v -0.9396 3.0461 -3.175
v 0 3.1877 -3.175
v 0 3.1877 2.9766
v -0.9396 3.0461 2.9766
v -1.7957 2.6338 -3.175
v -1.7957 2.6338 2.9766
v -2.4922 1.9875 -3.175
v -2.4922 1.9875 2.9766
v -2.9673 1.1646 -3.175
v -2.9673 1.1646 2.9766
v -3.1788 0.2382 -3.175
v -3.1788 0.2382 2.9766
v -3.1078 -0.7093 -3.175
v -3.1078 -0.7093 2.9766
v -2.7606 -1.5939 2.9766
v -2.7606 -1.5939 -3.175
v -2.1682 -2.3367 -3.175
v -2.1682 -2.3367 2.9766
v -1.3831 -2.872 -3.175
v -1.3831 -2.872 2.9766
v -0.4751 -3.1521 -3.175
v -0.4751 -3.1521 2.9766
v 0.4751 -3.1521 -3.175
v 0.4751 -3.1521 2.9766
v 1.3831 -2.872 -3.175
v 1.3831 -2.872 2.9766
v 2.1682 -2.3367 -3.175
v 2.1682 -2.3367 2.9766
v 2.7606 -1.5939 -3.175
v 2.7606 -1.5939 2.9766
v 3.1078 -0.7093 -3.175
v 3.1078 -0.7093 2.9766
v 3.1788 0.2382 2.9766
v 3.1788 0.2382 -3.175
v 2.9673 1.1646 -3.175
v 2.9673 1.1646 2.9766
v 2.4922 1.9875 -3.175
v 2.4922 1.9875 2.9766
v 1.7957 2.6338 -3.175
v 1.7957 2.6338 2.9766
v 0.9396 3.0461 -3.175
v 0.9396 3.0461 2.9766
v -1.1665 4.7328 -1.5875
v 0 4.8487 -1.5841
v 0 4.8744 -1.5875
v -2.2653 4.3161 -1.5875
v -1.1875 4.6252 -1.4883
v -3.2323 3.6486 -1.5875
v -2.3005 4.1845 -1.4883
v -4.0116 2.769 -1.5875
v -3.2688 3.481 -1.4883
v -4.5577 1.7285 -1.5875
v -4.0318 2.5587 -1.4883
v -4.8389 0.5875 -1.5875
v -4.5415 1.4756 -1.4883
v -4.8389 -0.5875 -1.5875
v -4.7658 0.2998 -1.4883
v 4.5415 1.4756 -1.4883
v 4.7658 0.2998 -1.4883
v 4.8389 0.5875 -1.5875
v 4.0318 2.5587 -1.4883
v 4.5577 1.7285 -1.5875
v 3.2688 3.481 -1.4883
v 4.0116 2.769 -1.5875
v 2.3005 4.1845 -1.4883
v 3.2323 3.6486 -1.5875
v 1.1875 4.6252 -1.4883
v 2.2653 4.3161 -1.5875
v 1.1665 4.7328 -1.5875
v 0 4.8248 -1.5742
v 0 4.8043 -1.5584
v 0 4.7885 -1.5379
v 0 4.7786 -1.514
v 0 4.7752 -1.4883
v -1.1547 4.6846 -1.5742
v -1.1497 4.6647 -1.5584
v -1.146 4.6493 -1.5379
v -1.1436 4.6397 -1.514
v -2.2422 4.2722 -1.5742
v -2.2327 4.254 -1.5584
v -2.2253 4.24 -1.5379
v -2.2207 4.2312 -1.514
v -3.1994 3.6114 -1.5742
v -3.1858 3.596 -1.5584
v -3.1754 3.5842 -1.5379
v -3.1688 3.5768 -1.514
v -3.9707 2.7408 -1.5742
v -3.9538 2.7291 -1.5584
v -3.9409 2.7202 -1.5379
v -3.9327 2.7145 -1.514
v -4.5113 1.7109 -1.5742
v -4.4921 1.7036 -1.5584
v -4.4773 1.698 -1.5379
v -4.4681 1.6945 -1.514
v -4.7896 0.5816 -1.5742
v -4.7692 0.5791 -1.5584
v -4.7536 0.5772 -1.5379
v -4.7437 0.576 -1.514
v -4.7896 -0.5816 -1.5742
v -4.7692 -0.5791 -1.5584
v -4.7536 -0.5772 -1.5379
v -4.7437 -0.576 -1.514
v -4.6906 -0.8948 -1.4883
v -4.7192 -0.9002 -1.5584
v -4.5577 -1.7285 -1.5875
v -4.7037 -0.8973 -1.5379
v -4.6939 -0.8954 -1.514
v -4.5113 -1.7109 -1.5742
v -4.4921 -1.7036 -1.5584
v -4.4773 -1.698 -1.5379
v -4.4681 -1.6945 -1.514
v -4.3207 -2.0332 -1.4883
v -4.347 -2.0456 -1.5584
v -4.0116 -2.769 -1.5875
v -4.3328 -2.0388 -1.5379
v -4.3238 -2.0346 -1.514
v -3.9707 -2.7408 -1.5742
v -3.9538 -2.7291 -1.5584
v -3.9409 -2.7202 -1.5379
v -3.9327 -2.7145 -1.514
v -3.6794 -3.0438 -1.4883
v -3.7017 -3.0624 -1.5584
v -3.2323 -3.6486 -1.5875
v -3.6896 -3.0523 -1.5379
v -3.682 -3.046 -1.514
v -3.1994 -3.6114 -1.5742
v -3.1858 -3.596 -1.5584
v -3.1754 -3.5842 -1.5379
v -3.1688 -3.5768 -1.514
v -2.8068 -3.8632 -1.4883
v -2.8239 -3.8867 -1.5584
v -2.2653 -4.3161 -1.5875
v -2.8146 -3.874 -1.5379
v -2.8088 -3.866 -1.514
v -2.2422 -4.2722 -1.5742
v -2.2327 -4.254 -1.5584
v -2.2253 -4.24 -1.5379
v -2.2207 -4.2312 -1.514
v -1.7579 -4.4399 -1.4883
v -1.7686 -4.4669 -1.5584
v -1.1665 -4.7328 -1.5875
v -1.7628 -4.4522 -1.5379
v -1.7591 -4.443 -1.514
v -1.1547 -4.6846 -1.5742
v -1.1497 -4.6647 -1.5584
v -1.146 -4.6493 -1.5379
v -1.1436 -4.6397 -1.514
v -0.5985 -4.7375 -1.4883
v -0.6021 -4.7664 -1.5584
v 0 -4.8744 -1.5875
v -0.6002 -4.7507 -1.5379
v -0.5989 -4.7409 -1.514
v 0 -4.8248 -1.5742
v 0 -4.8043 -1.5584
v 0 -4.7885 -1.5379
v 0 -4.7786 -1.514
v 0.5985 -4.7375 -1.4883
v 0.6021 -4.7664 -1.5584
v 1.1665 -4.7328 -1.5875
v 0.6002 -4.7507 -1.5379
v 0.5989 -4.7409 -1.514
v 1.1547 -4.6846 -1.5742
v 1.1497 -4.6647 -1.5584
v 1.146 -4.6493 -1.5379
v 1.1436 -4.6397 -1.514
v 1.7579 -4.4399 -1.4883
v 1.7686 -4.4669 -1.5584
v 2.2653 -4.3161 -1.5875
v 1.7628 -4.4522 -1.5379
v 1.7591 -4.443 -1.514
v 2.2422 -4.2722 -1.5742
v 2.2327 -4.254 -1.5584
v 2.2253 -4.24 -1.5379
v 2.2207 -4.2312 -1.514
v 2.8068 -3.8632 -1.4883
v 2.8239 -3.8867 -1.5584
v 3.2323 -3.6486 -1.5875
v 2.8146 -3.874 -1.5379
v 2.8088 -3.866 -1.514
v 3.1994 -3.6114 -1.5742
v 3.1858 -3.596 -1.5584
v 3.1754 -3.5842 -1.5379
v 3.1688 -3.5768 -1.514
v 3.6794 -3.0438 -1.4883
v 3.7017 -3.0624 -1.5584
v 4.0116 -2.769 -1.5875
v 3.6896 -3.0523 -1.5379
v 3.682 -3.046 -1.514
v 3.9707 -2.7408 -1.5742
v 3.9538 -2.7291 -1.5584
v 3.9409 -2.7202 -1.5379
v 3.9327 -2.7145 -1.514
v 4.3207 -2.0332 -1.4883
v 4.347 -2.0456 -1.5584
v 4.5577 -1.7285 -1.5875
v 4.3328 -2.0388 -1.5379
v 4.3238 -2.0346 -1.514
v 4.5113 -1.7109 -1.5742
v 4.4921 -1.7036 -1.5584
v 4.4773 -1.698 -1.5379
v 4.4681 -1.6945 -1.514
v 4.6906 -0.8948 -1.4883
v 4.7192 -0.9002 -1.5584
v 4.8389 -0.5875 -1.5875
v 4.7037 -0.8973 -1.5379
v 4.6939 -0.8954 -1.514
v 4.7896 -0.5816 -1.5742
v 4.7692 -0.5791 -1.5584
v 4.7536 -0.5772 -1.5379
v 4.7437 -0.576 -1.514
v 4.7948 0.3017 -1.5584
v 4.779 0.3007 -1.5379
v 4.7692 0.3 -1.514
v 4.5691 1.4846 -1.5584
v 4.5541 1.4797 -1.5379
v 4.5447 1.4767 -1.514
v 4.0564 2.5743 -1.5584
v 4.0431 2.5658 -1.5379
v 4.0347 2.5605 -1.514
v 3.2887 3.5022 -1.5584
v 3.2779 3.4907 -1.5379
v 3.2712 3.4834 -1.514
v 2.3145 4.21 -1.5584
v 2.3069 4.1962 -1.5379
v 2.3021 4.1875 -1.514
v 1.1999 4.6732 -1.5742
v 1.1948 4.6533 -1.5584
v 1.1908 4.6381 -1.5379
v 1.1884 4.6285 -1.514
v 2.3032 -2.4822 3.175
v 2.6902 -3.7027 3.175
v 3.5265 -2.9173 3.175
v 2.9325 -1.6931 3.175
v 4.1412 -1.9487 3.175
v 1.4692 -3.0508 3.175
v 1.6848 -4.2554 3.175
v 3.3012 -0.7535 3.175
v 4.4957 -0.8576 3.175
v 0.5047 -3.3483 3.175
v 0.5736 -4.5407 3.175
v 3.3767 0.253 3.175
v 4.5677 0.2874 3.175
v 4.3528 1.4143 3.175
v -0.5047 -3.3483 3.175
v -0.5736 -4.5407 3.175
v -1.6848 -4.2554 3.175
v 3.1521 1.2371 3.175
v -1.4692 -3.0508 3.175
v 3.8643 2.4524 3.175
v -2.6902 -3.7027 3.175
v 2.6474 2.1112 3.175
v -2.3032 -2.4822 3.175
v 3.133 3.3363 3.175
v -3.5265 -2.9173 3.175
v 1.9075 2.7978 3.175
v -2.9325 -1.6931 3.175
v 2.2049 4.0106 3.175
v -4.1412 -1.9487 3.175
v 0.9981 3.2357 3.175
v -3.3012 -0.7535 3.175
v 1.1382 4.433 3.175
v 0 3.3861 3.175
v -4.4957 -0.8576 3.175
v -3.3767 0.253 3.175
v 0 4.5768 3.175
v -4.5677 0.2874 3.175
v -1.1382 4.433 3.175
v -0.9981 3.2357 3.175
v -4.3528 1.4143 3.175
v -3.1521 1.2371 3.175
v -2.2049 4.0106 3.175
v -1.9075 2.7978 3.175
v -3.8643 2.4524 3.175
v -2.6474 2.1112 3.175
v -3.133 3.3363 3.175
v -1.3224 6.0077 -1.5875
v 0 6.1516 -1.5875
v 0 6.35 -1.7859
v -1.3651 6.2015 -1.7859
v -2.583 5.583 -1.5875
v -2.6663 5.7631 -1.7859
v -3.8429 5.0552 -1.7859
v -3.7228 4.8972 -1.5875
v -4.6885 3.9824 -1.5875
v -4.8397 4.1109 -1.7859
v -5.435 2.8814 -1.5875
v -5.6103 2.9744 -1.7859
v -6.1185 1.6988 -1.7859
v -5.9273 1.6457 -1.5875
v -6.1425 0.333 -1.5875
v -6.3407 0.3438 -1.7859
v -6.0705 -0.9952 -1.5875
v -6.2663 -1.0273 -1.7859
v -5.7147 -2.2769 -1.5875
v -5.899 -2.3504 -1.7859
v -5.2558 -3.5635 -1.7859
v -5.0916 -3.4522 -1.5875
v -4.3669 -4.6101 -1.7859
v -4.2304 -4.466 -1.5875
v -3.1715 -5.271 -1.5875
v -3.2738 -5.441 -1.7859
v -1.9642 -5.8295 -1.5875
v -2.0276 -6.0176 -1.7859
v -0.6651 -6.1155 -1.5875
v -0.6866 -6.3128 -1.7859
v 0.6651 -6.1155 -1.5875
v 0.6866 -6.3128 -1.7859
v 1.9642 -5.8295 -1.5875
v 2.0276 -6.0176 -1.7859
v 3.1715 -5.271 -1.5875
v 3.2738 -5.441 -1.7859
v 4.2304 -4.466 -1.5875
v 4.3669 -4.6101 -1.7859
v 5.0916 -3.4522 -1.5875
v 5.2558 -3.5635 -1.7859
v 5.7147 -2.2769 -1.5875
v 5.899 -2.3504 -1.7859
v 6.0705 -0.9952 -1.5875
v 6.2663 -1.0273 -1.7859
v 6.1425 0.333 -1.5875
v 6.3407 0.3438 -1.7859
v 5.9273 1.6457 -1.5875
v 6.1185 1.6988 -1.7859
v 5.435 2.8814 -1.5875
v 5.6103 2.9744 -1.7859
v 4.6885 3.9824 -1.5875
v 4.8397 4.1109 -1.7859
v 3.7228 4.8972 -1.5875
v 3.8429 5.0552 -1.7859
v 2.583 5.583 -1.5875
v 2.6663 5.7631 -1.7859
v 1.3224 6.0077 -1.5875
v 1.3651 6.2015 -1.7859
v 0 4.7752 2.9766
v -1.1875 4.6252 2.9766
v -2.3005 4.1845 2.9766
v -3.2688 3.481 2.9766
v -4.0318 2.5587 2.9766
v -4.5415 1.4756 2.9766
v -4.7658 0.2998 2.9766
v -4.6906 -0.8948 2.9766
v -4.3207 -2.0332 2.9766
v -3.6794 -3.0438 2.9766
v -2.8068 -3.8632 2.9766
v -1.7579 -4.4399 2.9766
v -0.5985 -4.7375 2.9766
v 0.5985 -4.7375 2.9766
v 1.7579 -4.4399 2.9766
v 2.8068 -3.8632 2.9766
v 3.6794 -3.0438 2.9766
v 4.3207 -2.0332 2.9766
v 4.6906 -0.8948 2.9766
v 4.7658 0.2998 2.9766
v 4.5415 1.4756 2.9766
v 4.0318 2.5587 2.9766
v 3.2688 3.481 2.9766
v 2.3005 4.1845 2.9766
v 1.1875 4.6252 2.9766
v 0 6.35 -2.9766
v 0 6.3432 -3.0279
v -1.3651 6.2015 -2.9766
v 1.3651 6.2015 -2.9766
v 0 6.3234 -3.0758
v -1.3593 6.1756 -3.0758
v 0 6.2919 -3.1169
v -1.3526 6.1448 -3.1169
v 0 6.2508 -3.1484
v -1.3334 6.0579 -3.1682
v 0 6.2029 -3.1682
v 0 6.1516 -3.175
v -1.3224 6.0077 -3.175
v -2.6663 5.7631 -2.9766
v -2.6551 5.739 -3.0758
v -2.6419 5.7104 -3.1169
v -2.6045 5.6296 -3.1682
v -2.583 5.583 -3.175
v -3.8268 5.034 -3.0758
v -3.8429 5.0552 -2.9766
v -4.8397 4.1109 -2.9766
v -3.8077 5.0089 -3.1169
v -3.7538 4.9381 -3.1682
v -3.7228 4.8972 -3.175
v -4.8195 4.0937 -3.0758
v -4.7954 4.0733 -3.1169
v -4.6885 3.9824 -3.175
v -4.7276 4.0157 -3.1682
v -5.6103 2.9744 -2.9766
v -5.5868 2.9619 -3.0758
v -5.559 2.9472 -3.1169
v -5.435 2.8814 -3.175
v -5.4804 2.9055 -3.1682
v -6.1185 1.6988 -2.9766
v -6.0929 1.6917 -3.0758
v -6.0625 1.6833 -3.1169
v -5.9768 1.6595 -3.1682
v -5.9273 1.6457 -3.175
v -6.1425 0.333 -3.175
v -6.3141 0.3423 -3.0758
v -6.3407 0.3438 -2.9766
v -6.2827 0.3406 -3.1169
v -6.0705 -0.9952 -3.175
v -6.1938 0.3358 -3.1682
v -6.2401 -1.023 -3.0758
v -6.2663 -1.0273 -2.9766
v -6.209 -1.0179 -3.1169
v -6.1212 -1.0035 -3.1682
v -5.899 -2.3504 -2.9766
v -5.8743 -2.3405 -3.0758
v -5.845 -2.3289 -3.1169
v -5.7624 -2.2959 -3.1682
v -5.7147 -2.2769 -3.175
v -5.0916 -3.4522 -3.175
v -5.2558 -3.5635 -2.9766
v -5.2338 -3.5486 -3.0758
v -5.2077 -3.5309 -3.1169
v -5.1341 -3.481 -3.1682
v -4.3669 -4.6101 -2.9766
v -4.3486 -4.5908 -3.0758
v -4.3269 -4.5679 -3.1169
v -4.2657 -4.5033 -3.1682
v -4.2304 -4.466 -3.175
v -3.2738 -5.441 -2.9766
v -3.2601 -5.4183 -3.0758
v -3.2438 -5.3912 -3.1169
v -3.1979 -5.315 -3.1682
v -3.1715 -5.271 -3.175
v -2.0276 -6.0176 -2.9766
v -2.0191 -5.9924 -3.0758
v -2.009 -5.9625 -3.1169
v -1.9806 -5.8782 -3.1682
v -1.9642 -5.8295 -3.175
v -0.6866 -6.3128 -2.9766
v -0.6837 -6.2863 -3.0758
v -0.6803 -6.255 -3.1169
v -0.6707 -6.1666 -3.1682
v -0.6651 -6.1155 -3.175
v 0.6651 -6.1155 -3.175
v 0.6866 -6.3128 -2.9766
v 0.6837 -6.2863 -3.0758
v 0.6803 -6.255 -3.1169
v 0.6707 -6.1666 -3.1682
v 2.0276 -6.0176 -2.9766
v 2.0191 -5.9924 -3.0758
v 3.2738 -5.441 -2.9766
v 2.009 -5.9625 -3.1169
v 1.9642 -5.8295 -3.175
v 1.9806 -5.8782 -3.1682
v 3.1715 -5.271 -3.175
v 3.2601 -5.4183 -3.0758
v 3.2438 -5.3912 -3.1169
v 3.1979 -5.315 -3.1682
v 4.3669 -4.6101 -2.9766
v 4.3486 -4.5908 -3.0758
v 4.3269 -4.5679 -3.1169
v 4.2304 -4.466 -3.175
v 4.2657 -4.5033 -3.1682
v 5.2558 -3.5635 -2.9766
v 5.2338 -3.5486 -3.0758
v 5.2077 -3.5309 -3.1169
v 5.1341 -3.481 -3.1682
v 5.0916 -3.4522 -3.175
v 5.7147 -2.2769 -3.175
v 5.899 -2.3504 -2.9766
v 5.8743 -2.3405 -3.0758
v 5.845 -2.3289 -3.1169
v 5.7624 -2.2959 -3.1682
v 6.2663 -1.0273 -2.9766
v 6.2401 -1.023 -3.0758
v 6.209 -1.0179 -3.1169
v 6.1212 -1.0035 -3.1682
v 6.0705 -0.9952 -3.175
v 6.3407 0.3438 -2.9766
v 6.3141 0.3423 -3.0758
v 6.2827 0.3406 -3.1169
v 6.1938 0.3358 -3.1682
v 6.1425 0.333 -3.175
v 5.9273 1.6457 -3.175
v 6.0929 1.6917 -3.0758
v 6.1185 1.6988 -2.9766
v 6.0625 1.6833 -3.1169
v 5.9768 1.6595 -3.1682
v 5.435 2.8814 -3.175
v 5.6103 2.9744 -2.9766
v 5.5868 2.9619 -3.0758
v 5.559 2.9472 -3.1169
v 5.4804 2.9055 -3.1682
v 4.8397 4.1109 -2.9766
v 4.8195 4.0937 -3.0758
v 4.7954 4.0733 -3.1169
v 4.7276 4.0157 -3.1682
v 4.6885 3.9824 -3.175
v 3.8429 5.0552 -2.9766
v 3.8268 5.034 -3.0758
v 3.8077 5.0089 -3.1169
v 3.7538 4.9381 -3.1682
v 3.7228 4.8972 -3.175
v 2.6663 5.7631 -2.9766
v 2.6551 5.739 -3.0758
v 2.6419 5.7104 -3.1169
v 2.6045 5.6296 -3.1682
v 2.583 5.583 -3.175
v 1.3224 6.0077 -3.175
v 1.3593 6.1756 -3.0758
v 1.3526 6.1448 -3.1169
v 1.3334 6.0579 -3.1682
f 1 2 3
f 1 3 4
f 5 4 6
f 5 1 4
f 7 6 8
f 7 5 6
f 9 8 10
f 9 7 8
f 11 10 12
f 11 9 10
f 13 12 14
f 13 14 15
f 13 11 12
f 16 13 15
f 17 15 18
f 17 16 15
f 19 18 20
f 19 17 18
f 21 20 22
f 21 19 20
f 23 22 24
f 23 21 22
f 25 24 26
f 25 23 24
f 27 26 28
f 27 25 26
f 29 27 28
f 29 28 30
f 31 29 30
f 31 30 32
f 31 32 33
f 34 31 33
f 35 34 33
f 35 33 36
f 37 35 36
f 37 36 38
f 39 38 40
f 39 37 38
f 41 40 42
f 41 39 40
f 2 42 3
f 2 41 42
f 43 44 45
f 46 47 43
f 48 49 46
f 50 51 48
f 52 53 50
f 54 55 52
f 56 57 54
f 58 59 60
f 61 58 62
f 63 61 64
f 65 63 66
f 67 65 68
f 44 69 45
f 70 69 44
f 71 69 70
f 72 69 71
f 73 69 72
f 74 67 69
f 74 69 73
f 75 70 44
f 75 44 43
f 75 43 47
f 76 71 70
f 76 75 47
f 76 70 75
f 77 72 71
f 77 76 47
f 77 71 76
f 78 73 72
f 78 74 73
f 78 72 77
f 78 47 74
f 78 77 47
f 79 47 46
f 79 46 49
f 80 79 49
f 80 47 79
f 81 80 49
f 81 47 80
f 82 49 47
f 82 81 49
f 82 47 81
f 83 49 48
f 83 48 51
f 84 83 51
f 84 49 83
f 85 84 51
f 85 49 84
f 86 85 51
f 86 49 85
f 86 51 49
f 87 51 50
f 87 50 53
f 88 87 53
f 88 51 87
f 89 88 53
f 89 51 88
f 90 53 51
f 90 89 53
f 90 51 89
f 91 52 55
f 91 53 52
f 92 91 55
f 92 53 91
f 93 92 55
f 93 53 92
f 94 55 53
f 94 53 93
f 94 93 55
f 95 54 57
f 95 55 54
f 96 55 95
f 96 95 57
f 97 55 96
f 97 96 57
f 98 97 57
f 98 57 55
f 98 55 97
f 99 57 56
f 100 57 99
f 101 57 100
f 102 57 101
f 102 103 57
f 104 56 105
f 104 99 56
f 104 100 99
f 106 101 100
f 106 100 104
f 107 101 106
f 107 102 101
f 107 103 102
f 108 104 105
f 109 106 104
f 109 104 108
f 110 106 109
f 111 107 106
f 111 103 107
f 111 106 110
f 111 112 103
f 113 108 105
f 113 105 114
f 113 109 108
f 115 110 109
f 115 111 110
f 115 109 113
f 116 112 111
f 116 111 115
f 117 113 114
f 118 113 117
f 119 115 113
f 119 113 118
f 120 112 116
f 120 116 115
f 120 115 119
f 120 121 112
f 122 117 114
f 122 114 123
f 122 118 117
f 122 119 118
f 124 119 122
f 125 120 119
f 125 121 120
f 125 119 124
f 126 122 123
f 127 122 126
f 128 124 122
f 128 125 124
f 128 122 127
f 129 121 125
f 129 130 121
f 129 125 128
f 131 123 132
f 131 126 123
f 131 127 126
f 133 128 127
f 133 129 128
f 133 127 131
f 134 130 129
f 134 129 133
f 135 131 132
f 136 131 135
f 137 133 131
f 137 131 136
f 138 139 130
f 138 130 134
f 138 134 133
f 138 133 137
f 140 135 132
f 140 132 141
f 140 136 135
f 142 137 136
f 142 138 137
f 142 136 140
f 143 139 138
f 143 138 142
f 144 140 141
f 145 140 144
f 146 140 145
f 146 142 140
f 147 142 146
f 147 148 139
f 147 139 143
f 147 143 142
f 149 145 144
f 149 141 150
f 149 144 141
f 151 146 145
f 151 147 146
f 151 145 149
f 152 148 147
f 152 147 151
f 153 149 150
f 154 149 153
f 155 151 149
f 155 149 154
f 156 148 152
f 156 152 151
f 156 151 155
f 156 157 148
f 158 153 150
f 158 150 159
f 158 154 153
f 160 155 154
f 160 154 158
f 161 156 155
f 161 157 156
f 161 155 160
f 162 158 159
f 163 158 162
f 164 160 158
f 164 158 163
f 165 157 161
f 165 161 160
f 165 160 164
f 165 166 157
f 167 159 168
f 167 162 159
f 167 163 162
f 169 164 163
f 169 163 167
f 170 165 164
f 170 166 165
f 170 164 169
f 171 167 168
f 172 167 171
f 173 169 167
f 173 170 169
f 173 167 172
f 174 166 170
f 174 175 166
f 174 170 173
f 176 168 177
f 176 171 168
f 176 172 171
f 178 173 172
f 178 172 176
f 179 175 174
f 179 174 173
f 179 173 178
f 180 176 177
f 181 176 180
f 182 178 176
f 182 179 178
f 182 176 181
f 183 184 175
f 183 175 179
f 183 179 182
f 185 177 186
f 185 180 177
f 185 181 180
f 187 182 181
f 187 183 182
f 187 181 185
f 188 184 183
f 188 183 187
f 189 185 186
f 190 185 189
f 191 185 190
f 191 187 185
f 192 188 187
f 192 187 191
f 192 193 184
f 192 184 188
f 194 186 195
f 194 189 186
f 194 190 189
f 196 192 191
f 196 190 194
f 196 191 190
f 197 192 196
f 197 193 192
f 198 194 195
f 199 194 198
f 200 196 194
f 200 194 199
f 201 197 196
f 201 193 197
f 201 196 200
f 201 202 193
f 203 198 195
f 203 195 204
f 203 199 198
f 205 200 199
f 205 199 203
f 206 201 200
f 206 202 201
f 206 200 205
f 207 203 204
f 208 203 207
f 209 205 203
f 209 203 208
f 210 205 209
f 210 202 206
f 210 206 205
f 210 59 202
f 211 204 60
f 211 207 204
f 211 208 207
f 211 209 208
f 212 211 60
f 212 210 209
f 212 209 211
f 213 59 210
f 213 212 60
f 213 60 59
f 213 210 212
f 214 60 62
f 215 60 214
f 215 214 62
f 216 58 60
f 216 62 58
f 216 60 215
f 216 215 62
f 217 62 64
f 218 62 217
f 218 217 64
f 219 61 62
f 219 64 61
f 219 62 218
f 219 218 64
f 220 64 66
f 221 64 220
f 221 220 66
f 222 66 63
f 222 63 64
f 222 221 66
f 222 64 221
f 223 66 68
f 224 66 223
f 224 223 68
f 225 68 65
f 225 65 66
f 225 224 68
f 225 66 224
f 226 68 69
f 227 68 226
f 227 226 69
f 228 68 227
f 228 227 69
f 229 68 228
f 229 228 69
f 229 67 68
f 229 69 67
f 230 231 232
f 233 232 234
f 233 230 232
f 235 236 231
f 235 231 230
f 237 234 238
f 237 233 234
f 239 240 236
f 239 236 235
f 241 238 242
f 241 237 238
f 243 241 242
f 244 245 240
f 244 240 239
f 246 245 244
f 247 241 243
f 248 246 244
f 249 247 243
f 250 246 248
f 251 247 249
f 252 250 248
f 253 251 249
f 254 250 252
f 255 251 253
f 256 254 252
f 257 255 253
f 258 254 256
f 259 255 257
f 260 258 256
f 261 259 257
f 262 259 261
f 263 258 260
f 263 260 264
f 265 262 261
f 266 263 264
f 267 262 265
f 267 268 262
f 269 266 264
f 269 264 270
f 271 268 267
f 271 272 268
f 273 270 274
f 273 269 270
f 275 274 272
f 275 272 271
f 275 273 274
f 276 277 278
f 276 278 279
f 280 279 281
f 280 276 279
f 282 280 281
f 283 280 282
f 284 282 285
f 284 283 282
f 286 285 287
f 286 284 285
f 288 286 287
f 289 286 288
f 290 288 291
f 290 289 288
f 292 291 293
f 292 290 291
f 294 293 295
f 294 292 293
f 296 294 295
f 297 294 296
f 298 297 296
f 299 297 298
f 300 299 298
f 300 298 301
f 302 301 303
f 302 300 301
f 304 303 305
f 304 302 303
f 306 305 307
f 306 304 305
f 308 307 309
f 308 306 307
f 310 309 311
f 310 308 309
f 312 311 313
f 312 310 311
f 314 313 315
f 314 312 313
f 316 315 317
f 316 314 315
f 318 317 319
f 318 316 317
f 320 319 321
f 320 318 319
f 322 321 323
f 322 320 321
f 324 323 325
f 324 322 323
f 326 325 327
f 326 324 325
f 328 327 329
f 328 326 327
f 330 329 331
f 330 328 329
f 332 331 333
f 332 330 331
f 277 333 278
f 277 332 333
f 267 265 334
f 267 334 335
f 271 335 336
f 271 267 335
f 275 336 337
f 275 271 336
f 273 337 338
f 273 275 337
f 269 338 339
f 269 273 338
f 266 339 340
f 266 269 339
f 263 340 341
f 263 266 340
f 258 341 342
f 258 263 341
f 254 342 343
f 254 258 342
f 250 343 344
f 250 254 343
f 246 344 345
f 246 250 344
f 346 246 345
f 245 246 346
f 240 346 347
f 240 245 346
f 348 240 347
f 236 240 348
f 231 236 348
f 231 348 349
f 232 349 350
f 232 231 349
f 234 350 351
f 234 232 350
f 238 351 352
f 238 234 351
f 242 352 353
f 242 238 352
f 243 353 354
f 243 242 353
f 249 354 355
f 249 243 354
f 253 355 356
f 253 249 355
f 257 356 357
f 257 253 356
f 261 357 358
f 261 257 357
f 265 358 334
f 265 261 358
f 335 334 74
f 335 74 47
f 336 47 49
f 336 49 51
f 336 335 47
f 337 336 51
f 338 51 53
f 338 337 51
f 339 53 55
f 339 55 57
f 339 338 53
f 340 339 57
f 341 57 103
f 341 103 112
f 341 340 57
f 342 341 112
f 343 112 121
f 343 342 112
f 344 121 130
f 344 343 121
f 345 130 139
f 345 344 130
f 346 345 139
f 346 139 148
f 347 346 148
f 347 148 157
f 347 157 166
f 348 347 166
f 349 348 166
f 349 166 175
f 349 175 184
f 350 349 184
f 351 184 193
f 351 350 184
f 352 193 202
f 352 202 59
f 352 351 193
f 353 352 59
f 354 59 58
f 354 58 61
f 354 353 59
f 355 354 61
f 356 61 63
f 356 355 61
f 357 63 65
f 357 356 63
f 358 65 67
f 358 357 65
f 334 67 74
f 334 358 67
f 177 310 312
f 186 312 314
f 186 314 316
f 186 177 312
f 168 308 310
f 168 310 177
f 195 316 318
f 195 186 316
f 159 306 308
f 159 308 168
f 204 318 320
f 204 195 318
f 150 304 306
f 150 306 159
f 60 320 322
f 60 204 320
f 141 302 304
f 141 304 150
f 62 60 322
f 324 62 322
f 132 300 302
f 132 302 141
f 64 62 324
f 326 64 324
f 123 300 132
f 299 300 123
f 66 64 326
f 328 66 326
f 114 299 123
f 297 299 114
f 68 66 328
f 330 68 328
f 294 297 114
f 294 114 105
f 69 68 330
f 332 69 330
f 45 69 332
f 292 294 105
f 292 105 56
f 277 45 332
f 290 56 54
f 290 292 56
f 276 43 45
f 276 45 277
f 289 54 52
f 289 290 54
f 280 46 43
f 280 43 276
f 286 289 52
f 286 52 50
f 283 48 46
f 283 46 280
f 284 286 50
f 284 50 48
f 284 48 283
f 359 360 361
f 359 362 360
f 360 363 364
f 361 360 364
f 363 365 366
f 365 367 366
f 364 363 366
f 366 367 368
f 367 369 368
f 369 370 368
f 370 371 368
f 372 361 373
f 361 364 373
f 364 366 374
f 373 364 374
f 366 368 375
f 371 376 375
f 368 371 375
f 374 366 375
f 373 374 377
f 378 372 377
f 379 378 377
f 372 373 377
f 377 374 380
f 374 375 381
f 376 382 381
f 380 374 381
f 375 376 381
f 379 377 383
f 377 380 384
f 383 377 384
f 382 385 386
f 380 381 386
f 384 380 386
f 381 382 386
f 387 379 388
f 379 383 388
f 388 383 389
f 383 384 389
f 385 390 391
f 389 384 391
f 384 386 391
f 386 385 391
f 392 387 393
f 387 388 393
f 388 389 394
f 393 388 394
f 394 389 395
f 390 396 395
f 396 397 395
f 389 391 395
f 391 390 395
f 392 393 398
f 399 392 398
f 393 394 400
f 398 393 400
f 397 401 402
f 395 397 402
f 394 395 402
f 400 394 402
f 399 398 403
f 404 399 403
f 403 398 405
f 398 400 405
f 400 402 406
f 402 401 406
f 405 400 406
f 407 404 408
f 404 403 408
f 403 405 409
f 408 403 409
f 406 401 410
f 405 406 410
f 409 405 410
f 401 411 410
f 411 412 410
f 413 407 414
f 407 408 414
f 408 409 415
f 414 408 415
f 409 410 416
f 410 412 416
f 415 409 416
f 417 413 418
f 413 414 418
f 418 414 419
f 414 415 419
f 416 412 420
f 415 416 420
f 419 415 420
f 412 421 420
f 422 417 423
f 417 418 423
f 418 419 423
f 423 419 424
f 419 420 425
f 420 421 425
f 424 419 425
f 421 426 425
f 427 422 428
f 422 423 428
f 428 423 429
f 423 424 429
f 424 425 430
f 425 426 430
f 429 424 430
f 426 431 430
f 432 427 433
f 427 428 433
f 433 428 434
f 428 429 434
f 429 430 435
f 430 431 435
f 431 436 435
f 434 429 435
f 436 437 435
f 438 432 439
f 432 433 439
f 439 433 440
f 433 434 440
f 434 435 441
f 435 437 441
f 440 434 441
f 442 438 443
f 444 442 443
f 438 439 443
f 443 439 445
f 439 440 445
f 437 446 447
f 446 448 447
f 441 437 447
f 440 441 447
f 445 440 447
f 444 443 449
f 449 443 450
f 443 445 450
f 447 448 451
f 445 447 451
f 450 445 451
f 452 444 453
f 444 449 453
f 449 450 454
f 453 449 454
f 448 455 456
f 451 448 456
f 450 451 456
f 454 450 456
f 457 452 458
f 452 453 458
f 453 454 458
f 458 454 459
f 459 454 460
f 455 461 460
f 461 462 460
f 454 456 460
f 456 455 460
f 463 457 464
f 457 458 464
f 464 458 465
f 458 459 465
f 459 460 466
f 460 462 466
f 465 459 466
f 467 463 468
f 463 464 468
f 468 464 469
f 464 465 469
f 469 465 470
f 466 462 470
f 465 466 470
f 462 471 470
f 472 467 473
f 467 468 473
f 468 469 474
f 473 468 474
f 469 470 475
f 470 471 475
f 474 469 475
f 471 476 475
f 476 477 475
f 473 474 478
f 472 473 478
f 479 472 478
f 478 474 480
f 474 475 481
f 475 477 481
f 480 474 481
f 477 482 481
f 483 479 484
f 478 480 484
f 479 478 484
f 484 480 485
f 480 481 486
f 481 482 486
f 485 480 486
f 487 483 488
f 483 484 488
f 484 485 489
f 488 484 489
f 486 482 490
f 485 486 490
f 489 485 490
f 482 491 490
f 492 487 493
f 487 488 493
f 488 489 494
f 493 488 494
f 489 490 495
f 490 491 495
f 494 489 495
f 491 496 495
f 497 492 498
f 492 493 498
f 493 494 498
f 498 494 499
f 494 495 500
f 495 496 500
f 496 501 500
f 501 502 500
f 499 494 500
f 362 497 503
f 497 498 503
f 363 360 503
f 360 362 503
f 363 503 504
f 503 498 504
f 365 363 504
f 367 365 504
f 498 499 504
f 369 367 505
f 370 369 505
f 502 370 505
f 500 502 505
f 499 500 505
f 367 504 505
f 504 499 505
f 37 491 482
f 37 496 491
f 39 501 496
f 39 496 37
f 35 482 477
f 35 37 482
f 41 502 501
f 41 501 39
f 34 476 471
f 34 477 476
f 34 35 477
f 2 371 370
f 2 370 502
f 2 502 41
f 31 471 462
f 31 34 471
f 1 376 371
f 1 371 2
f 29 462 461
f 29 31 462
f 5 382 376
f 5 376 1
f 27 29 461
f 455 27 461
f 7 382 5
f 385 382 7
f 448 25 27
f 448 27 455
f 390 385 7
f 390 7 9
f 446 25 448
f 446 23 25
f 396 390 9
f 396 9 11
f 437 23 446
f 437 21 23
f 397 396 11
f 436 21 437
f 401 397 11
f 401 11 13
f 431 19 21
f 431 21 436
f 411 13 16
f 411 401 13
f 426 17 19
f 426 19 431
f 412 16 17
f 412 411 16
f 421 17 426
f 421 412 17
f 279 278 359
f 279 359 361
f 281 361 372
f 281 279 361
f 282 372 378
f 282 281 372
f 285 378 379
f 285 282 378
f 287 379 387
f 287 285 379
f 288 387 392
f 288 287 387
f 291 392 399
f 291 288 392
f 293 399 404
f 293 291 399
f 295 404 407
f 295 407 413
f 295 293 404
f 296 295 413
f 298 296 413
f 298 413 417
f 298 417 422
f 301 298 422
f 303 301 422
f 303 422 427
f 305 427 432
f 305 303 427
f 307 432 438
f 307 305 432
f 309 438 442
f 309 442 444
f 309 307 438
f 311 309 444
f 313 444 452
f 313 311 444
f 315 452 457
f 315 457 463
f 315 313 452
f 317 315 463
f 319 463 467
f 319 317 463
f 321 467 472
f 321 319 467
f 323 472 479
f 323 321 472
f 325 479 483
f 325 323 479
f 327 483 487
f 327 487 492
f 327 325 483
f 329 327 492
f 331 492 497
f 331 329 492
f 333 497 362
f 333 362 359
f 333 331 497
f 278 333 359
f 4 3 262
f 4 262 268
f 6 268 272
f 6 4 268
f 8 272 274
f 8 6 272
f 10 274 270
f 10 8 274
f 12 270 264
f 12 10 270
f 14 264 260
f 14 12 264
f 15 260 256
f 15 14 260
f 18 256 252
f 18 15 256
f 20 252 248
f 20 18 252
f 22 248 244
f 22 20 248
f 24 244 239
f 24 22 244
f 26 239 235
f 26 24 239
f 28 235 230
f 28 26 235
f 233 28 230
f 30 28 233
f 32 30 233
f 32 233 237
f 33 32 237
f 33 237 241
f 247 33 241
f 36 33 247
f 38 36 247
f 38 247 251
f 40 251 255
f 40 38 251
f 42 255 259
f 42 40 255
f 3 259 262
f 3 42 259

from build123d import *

# Parameters (mm, degrees)
CHAMFER1_SIZE = 0.1984375
FILLET1_R     = 0.1984375
FILLET2_R     = 0.09921875


with BuildPart() as part:
    # Sketch3 → Revolve1 (revolve)
    with BuildSketch(Plane(origin=(0, 0, 0), x_dir=(0, 0, -1), z_dir=(1, 0, 0))):
        Polygon((3.175, 6.35), (1.5875, 6.35), (1.5875, 4.7752), (-3.175, 4.7752), (-3.175, 3.1877), (3.175, 3.1877), align=None)
    revolve(axis=Axis((0, 0, -3.175), (0, 0, 1)))

    # Chamfer1
    chamfer1_edges = [part.edges().sort_by_distance(p)[0] for p in [
        (0, -3.1877, 3.175),
        (0, -4.7752, 3.175),
        (0, -6.35, -1.5875),
    ]]
    chamfer(chamfer1_edges, length=CHAMFER1_SIZE)

    # Fillet1
    fillet1_edges = [part.edges().sort_by_distance(p)[0] for p in [
        (0, -6.35, -3.175),
    ]]
    fillet(fillet1_edges, radius=FILLET1_R)

    # Fillet2
    fillet2_edges = [part.edges().sort_by_distance(p)[0] for p in [
        (0, -4.7752, -1.5875),
    ]]
    fillet(fillet2_edges, radius=FILLET2_R)


solid = part.part
